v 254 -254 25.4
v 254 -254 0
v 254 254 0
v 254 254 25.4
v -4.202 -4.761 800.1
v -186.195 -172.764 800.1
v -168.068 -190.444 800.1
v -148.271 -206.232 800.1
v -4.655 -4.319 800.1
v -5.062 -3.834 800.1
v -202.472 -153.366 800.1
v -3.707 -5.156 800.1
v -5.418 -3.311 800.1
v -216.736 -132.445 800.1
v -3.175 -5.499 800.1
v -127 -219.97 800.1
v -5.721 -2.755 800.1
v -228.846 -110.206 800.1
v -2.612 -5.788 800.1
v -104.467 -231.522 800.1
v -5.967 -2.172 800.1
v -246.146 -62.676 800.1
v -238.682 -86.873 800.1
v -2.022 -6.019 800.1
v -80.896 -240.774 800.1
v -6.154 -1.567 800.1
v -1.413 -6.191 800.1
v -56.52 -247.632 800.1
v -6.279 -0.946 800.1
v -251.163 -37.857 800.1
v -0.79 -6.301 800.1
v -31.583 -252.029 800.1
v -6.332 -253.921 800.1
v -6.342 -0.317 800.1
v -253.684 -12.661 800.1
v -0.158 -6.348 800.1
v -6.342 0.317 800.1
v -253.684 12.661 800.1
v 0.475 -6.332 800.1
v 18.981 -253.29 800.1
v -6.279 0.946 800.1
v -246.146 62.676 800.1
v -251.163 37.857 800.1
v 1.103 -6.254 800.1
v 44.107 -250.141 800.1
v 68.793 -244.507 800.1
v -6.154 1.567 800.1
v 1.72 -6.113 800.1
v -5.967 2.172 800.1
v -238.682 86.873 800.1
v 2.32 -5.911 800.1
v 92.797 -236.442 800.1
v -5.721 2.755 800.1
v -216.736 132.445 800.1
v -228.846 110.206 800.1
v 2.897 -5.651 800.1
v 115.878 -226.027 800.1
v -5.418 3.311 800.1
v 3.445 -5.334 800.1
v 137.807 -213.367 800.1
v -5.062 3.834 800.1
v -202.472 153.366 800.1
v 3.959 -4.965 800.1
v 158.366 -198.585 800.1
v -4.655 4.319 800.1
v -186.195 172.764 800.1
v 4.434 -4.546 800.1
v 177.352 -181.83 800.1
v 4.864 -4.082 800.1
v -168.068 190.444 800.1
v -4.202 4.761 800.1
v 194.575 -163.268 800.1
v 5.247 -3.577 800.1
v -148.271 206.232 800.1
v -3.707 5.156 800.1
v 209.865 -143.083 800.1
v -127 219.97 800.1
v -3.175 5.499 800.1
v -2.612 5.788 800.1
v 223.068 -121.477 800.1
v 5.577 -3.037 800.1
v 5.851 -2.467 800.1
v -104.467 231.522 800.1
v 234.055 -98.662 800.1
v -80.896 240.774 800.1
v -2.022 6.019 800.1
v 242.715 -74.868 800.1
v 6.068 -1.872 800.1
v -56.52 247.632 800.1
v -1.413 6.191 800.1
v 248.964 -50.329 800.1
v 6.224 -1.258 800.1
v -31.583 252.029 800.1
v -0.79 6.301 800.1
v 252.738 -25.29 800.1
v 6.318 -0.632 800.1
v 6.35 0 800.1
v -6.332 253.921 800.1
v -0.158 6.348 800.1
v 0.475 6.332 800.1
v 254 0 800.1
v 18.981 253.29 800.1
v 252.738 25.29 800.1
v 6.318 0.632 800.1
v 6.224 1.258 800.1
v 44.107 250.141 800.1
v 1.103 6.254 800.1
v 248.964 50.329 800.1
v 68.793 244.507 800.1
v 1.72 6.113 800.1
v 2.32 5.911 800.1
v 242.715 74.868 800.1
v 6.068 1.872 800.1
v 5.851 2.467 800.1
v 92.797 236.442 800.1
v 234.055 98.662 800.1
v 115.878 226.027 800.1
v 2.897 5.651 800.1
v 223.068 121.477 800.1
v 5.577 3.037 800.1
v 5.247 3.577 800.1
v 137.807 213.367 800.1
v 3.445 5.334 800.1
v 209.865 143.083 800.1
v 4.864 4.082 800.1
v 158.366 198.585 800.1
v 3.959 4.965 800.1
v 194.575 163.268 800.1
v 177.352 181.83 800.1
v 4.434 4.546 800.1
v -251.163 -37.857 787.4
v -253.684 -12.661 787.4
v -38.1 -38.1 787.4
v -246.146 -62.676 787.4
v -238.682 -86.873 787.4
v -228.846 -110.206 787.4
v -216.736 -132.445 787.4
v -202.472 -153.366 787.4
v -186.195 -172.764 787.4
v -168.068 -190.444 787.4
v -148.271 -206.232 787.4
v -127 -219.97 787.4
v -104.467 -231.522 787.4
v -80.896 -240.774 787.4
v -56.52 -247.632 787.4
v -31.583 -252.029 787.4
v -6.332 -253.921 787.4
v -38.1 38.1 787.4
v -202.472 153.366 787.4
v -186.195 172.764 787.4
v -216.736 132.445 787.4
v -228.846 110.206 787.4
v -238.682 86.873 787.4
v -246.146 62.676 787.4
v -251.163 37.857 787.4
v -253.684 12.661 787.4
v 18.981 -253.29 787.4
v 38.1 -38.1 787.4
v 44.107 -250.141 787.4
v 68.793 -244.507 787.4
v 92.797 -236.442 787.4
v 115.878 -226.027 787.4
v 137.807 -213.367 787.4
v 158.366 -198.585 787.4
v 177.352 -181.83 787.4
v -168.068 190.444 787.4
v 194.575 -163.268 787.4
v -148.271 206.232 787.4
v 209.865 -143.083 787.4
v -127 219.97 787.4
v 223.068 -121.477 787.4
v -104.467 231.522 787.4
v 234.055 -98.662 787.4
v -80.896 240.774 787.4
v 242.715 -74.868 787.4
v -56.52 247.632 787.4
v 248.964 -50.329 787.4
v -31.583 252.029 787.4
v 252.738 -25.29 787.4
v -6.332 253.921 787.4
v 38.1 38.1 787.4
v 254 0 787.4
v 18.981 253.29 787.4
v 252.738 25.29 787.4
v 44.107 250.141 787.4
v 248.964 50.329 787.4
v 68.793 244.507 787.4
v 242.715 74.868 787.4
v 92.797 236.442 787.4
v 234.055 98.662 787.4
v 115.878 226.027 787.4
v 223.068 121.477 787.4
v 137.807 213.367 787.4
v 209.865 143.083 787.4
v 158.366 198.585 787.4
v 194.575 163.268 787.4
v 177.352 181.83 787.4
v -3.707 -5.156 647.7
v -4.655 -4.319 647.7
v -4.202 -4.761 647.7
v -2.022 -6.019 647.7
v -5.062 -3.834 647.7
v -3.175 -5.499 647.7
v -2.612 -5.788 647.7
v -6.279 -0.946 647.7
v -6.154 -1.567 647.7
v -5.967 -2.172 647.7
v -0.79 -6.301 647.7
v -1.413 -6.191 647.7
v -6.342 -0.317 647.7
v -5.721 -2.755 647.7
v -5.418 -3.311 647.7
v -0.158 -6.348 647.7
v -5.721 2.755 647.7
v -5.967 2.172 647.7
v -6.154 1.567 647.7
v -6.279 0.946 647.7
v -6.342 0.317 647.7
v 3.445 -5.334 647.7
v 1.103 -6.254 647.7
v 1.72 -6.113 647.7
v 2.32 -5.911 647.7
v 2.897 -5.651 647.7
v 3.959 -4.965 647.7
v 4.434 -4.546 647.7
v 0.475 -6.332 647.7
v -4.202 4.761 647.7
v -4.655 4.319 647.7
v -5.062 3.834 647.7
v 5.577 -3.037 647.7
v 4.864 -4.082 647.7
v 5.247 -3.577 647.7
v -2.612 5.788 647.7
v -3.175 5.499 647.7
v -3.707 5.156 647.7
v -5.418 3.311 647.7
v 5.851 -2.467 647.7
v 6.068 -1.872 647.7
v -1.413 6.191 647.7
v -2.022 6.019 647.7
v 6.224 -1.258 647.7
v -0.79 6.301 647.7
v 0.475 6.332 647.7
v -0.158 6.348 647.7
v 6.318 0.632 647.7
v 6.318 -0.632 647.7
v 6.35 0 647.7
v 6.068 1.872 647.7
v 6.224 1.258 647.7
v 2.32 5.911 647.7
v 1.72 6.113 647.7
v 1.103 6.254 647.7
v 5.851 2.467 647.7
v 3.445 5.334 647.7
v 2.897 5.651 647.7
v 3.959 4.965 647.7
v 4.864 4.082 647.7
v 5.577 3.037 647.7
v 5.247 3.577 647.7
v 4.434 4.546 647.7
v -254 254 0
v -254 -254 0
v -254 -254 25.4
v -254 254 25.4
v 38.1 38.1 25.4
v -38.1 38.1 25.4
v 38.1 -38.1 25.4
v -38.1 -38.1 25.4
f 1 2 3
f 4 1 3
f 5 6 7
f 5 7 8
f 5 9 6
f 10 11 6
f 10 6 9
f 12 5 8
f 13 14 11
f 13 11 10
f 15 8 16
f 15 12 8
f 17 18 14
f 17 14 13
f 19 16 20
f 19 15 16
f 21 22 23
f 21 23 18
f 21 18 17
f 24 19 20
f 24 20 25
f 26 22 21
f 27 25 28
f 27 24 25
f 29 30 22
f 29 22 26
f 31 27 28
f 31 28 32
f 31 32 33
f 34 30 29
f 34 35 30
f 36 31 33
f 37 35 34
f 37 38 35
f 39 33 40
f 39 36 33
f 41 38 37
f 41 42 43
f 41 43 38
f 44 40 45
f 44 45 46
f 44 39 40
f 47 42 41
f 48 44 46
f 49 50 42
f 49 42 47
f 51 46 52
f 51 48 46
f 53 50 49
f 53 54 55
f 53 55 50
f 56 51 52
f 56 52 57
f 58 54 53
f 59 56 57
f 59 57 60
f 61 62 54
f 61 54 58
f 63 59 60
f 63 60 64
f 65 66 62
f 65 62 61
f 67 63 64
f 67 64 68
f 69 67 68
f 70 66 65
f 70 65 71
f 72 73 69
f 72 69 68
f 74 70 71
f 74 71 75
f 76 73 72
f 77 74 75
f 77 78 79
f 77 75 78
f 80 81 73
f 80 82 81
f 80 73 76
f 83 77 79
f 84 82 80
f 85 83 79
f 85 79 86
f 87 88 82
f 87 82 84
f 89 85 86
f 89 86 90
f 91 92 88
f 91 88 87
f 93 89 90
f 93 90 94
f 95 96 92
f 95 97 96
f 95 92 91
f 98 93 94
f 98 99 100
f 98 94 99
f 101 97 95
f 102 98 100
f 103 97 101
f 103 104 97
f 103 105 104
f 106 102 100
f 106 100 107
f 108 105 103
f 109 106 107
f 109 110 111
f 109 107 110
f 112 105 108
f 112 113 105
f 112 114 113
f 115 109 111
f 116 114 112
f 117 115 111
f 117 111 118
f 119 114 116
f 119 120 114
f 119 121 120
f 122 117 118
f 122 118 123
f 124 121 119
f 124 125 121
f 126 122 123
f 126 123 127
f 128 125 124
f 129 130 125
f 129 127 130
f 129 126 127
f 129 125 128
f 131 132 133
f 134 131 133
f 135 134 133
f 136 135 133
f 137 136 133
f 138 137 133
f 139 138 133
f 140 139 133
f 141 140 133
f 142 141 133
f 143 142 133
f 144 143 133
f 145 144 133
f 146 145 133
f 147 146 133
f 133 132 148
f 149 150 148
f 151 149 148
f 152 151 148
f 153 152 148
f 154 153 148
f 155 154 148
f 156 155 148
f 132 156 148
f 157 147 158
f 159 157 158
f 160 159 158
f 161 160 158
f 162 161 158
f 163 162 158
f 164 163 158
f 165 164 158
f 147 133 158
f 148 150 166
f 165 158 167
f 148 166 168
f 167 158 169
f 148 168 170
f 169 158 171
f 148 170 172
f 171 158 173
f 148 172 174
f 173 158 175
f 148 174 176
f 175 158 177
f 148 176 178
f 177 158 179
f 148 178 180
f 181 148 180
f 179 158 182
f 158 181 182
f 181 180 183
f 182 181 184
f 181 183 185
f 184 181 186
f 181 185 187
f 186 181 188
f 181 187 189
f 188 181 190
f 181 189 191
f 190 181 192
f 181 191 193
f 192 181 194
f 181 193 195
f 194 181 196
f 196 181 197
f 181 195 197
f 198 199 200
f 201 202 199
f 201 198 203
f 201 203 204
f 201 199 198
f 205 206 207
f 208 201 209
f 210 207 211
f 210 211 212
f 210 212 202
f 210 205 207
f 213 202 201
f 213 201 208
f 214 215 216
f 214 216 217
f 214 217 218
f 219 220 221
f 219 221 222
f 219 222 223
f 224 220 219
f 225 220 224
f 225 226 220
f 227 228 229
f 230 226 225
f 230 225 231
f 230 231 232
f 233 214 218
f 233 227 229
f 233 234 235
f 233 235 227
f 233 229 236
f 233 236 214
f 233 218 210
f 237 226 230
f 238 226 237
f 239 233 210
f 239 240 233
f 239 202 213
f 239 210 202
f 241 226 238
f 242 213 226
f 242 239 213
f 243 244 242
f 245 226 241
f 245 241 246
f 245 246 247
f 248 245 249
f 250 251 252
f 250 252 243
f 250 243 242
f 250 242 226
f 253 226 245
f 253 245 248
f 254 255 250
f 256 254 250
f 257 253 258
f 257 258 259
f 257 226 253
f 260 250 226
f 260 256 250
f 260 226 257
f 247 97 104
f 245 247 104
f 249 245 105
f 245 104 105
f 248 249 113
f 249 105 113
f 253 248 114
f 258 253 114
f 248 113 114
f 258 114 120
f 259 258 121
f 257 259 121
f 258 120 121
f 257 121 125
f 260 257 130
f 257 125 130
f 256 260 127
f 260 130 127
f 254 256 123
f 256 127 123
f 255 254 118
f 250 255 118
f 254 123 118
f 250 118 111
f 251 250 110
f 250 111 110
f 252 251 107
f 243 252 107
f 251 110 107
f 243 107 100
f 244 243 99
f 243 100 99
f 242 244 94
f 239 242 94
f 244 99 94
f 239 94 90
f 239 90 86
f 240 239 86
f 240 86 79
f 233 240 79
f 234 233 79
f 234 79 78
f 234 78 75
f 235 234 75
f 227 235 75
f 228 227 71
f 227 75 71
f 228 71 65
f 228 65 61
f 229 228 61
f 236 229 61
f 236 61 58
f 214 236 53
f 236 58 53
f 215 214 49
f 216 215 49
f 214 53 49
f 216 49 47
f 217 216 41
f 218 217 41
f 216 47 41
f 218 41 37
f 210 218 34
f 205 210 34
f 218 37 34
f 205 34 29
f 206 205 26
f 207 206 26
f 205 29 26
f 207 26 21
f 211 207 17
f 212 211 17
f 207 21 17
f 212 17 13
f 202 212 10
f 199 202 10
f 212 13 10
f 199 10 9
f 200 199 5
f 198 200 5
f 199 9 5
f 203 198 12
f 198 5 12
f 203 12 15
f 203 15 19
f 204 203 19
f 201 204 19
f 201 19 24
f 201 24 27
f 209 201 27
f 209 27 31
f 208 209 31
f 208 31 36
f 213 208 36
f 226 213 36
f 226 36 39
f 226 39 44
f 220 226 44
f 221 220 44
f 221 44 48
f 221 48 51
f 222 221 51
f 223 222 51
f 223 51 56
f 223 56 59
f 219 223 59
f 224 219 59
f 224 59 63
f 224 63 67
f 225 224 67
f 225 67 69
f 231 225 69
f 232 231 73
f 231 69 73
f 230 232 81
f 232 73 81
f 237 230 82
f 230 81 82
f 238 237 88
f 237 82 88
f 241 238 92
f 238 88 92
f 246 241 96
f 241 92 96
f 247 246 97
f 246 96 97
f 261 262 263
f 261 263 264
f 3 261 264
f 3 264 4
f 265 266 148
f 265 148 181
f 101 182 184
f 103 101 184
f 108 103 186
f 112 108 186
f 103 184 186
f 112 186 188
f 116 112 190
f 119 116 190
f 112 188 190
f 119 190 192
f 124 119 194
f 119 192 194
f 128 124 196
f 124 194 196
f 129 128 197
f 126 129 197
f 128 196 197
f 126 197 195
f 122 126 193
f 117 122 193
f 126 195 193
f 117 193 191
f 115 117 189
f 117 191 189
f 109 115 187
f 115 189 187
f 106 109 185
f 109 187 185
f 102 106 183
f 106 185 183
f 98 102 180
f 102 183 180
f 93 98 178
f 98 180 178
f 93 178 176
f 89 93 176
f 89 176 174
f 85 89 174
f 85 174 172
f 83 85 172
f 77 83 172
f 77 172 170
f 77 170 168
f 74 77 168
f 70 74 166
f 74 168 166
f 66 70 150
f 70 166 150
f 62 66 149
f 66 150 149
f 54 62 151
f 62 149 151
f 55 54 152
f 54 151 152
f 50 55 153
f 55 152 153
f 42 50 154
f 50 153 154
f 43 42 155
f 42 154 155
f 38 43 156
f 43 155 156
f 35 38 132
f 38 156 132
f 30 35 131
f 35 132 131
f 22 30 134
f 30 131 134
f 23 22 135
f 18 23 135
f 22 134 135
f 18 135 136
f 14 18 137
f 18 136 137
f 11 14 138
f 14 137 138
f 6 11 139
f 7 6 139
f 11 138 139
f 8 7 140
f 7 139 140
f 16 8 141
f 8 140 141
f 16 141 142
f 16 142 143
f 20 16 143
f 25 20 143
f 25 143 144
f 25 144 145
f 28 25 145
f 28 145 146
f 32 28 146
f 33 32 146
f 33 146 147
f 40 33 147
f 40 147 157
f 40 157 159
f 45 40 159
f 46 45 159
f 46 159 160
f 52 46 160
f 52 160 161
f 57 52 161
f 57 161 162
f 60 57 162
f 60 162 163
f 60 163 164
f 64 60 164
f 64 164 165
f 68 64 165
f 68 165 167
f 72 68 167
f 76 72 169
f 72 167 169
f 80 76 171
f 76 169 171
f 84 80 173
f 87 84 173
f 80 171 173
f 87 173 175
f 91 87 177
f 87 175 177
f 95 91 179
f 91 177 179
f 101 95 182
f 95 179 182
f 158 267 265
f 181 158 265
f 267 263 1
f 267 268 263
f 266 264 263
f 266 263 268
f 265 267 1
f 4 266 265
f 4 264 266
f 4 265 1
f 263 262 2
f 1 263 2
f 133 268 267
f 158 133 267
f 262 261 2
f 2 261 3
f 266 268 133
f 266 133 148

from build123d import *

# Parameters (mm, degrees)
F0_W     = 508
F0_H     = 508
F1_DEPTH = 25.4
F2_W     = 76.2
F2_H     = 76.2
F3_DEPTH = 762
F4_R     = 254
F5_DEPTH = 12.7
F6_R     = 6.35
F7_DEPTH = 152.4


with BuildPart() as f1:
    # F0 (on Top) → F1 (new body)
    with BuildSketch(Plane.XY):
        Rectangle(F0_W, F0_H)
    extrude(amount=F1_DEPTH)

    # F2 (on face) → F3 (join)
    with BuildSketch(Plane.XY.offset(25.4)):
        Rectangle(F2_W, F2_H)
    extrude(amount=F3_DEPTH)

    # F4 (on face) → F5 (join)
    with BuildSketch(Plane.XY.offset(787.4)):
        Circle(F4_R)
    extrude(amount=F5_DEPTH)

    # F6 (on face) → F7 (cut)
    with BuildSketch(Plane.XY.offset(800.1)):
        Circle(F6_R)
    extrude(amount=-F7_DEPTH, mode=Mode.SUBTRACT)


solid = f1.part
